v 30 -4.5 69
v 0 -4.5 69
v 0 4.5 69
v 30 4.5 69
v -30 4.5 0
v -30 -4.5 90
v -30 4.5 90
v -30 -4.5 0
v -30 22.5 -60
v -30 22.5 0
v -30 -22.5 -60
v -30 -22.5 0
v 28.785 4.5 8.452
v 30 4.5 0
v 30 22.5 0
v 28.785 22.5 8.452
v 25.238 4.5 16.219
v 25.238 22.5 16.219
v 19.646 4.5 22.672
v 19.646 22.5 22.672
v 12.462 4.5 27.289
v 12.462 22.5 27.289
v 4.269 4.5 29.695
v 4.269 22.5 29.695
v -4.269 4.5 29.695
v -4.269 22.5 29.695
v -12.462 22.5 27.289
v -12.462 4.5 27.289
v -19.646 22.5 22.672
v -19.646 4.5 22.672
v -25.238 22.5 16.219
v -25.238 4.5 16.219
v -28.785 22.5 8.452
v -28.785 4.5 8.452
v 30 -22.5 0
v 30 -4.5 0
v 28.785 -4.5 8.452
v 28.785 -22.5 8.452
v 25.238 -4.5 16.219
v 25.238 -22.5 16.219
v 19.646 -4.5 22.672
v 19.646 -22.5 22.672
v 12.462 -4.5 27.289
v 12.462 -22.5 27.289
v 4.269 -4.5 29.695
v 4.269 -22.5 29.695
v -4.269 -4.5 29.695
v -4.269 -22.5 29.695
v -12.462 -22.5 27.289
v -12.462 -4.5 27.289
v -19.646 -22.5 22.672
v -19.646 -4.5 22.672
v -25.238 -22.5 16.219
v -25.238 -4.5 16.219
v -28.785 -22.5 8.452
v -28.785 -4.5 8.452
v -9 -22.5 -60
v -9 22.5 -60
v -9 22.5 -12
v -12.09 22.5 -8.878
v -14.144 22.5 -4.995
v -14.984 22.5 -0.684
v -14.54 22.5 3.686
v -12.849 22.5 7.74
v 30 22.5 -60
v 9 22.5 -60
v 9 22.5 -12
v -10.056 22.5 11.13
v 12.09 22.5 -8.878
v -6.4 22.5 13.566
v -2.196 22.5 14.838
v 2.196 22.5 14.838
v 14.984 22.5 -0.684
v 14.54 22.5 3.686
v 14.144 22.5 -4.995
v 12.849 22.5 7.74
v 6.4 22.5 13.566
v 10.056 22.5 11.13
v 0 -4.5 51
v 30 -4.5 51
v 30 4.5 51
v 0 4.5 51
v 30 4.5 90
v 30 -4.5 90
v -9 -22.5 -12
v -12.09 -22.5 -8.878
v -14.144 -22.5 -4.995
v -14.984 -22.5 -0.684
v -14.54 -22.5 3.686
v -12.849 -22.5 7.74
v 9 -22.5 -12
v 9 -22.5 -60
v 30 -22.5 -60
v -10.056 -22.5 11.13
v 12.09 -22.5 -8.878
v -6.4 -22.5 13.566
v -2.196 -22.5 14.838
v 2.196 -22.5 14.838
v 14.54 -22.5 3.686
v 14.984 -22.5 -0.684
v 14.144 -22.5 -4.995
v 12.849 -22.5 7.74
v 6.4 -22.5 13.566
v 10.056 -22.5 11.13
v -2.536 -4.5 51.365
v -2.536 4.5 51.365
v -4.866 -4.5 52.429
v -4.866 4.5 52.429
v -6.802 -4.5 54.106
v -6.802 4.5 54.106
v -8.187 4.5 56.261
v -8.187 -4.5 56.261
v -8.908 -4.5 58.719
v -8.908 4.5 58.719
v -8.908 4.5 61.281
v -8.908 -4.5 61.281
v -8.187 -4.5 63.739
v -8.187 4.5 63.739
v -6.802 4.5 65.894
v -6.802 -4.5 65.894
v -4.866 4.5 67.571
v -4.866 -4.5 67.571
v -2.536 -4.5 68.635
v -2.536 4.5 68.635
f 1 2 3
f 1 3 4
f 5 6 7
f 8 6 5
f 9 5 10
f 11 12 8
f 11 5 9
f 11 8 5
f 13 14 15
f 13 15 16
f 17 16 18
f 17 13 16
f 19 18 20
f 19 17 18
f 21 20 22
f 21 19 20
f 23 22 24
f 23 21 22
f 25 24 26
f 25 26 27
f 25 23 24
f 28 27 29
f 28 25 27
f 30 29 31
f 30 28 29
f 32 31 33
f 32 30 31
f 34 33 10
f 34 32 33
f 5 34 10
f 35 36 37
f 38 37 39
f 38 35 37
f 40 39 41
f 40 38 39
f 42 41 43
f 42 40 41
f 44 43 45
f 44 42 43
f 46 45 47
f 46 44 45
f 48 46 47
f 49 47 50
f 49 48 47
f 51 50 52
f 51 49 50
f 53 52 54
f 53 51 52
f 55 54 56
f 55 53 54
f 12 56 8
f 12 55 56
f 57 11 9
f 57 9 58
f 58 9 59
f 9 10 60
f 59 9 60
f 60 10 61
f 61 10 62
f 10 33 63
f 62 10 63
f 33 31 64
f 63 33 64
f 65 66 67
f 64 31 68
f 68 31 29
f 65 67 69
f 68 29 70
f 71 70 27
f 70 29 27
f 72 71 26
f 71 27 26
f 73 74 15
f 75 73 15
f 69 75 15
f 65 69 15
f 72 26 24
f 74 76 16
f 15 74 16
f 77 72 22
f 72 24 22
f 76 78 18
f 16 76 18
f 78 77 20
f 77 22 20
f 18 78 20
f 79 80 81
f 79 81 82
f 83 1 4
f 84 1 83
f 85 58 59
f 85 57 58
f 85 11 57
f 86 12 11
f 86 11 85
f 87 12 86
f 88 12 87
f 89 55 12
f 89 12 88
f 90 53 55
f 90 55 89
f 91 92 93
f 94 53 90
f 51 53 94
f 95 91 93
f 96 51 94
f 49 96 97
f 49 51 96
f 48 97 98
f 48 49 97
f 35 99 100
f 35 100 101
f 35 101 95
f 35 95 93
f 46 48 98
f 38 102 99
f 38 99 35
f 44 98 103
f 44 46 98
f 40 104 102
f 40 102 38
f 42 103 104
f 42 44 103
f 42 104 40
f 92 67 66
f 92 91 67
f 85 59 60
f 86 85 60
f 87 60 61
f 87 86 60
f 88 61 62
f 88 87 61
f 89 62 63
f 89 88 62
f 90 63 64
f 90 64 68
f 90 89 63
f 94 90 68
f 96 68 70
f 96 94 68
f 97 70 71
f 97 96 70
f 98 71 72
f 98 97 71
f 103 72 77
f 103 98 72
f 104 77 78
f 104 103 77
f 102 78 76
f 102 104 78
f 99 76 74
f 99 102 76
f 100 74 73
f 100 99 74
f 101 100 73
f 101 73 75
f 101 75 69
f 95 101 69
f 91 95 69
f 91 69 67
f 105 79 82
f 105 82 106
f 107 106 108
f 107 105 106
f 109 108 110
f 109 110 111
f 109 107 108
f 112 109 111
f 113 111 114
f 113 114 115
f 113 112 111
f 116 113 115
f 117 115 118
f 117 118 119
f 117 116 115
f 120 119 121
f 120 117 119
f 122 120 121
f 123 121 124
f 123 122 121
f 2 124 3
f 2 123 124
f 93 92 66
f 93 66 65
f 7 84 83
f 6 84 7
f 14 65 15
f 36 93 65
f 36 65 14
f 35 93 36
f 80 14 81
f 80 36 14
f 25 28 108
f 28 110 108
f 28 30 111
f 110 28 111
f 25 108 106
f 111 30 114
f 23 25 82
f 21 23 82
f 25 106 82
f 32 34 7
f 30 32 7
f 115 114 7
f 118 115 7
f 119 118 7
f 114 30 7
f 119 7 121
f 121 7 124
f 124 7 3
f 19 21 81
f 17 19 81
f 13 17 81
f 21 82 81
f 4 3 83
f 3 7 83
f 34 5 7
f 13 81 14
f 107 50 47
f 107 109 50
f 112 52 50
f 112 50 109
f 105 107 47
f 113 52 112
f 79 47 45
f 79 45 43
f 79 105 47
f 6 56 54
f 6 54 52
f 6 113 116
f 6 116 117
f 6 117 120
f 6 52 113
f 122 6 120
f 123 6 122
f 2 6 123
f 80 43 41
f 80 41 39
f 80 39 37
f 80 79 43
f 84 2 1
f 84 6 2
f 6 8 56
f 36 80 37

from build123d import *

# Parameters (mm, degrees)
F1_DEPTH = 22.5
F3_DEPTH = 4.5


with BuildPart() as f1:
    # F0 (on Front) → F1 (new body, symmetric)
    with BuildSketch(Plane.XZ):
        with BuildLine():
            Line((-30, 0), (-15, 0))
            ThreePointArc((-15, 0), (0, 15), (15, 0))
            Line((15, 0), (30, 0))
            ThreePointArc((30, 0), (0, 30), (-30, 0))
        make_face()
        with BuildLine():
            ThreePointArc((15, 0), (13.416407865, -6.7082039325), (9, -12))
            Line((9, -12), (9, -28.6181760425))
            ThreePointArc((9, -28.6181760425), (24.1867732449, -17.7482393493), (30, 0))
            Line((30, 0), (15, 0))
        make_face()
        with BuildLine():
            Line((-9, -28.6181760425), (-9, -12))
            ThreePointArc((-9, -12), (-13.416407865, -6.7082039325), (-15, 0))
            Line((-15, 0), (-30, 0))
            ThreePointArc((-30, 0), (-24.1867732449, -17.7482393493), (-9, -28.6181760425))
        make_face()
        with BuildLine():
            Line((-9, -60), (-9, -28.6181760425))
            ThreePointArc((-9, -28.6181760425), (-24.1867732449, -17.7482393493), (-30, 0))
            Line((-30, 0), (-30, -60))
            Line((-30, -60), (-9, -60))
        make_face()
        with BuildLine():
            ThreePointArc((30, 0), (24.1867732449, -17.7482393493), (9, -28.6181760425))
            Line((9, -28.6181760425), (9, -60))
            Line((9, -60), (30, -60))
            Line((30, -60), (30, 0))
        make_face()
    extrude(amount=F1_DEPTH, both=True)

    # F2 (on Front) → F3 (join, symmetric)
    with BuildSketch(Plane.XZ):
        with BuildLine():
            Line((-30, 90), (-30, 0))
            ThreePointArc((-30, 0), (0, 30), (30, 0))
            Line((30, 0), (30, 51))
            Line((30, 51), (0, 51))
            ThreePointArc((0, 51), (-9, 60), (0, 69))
            Line((0, 69), (30, 69))
            Line((30, 69), (30, 90))
            Line((30, 90), (-30, 90))
        make_face()
    extrude(amount=F3_DEPTH, both=True)


solid = f1.part
